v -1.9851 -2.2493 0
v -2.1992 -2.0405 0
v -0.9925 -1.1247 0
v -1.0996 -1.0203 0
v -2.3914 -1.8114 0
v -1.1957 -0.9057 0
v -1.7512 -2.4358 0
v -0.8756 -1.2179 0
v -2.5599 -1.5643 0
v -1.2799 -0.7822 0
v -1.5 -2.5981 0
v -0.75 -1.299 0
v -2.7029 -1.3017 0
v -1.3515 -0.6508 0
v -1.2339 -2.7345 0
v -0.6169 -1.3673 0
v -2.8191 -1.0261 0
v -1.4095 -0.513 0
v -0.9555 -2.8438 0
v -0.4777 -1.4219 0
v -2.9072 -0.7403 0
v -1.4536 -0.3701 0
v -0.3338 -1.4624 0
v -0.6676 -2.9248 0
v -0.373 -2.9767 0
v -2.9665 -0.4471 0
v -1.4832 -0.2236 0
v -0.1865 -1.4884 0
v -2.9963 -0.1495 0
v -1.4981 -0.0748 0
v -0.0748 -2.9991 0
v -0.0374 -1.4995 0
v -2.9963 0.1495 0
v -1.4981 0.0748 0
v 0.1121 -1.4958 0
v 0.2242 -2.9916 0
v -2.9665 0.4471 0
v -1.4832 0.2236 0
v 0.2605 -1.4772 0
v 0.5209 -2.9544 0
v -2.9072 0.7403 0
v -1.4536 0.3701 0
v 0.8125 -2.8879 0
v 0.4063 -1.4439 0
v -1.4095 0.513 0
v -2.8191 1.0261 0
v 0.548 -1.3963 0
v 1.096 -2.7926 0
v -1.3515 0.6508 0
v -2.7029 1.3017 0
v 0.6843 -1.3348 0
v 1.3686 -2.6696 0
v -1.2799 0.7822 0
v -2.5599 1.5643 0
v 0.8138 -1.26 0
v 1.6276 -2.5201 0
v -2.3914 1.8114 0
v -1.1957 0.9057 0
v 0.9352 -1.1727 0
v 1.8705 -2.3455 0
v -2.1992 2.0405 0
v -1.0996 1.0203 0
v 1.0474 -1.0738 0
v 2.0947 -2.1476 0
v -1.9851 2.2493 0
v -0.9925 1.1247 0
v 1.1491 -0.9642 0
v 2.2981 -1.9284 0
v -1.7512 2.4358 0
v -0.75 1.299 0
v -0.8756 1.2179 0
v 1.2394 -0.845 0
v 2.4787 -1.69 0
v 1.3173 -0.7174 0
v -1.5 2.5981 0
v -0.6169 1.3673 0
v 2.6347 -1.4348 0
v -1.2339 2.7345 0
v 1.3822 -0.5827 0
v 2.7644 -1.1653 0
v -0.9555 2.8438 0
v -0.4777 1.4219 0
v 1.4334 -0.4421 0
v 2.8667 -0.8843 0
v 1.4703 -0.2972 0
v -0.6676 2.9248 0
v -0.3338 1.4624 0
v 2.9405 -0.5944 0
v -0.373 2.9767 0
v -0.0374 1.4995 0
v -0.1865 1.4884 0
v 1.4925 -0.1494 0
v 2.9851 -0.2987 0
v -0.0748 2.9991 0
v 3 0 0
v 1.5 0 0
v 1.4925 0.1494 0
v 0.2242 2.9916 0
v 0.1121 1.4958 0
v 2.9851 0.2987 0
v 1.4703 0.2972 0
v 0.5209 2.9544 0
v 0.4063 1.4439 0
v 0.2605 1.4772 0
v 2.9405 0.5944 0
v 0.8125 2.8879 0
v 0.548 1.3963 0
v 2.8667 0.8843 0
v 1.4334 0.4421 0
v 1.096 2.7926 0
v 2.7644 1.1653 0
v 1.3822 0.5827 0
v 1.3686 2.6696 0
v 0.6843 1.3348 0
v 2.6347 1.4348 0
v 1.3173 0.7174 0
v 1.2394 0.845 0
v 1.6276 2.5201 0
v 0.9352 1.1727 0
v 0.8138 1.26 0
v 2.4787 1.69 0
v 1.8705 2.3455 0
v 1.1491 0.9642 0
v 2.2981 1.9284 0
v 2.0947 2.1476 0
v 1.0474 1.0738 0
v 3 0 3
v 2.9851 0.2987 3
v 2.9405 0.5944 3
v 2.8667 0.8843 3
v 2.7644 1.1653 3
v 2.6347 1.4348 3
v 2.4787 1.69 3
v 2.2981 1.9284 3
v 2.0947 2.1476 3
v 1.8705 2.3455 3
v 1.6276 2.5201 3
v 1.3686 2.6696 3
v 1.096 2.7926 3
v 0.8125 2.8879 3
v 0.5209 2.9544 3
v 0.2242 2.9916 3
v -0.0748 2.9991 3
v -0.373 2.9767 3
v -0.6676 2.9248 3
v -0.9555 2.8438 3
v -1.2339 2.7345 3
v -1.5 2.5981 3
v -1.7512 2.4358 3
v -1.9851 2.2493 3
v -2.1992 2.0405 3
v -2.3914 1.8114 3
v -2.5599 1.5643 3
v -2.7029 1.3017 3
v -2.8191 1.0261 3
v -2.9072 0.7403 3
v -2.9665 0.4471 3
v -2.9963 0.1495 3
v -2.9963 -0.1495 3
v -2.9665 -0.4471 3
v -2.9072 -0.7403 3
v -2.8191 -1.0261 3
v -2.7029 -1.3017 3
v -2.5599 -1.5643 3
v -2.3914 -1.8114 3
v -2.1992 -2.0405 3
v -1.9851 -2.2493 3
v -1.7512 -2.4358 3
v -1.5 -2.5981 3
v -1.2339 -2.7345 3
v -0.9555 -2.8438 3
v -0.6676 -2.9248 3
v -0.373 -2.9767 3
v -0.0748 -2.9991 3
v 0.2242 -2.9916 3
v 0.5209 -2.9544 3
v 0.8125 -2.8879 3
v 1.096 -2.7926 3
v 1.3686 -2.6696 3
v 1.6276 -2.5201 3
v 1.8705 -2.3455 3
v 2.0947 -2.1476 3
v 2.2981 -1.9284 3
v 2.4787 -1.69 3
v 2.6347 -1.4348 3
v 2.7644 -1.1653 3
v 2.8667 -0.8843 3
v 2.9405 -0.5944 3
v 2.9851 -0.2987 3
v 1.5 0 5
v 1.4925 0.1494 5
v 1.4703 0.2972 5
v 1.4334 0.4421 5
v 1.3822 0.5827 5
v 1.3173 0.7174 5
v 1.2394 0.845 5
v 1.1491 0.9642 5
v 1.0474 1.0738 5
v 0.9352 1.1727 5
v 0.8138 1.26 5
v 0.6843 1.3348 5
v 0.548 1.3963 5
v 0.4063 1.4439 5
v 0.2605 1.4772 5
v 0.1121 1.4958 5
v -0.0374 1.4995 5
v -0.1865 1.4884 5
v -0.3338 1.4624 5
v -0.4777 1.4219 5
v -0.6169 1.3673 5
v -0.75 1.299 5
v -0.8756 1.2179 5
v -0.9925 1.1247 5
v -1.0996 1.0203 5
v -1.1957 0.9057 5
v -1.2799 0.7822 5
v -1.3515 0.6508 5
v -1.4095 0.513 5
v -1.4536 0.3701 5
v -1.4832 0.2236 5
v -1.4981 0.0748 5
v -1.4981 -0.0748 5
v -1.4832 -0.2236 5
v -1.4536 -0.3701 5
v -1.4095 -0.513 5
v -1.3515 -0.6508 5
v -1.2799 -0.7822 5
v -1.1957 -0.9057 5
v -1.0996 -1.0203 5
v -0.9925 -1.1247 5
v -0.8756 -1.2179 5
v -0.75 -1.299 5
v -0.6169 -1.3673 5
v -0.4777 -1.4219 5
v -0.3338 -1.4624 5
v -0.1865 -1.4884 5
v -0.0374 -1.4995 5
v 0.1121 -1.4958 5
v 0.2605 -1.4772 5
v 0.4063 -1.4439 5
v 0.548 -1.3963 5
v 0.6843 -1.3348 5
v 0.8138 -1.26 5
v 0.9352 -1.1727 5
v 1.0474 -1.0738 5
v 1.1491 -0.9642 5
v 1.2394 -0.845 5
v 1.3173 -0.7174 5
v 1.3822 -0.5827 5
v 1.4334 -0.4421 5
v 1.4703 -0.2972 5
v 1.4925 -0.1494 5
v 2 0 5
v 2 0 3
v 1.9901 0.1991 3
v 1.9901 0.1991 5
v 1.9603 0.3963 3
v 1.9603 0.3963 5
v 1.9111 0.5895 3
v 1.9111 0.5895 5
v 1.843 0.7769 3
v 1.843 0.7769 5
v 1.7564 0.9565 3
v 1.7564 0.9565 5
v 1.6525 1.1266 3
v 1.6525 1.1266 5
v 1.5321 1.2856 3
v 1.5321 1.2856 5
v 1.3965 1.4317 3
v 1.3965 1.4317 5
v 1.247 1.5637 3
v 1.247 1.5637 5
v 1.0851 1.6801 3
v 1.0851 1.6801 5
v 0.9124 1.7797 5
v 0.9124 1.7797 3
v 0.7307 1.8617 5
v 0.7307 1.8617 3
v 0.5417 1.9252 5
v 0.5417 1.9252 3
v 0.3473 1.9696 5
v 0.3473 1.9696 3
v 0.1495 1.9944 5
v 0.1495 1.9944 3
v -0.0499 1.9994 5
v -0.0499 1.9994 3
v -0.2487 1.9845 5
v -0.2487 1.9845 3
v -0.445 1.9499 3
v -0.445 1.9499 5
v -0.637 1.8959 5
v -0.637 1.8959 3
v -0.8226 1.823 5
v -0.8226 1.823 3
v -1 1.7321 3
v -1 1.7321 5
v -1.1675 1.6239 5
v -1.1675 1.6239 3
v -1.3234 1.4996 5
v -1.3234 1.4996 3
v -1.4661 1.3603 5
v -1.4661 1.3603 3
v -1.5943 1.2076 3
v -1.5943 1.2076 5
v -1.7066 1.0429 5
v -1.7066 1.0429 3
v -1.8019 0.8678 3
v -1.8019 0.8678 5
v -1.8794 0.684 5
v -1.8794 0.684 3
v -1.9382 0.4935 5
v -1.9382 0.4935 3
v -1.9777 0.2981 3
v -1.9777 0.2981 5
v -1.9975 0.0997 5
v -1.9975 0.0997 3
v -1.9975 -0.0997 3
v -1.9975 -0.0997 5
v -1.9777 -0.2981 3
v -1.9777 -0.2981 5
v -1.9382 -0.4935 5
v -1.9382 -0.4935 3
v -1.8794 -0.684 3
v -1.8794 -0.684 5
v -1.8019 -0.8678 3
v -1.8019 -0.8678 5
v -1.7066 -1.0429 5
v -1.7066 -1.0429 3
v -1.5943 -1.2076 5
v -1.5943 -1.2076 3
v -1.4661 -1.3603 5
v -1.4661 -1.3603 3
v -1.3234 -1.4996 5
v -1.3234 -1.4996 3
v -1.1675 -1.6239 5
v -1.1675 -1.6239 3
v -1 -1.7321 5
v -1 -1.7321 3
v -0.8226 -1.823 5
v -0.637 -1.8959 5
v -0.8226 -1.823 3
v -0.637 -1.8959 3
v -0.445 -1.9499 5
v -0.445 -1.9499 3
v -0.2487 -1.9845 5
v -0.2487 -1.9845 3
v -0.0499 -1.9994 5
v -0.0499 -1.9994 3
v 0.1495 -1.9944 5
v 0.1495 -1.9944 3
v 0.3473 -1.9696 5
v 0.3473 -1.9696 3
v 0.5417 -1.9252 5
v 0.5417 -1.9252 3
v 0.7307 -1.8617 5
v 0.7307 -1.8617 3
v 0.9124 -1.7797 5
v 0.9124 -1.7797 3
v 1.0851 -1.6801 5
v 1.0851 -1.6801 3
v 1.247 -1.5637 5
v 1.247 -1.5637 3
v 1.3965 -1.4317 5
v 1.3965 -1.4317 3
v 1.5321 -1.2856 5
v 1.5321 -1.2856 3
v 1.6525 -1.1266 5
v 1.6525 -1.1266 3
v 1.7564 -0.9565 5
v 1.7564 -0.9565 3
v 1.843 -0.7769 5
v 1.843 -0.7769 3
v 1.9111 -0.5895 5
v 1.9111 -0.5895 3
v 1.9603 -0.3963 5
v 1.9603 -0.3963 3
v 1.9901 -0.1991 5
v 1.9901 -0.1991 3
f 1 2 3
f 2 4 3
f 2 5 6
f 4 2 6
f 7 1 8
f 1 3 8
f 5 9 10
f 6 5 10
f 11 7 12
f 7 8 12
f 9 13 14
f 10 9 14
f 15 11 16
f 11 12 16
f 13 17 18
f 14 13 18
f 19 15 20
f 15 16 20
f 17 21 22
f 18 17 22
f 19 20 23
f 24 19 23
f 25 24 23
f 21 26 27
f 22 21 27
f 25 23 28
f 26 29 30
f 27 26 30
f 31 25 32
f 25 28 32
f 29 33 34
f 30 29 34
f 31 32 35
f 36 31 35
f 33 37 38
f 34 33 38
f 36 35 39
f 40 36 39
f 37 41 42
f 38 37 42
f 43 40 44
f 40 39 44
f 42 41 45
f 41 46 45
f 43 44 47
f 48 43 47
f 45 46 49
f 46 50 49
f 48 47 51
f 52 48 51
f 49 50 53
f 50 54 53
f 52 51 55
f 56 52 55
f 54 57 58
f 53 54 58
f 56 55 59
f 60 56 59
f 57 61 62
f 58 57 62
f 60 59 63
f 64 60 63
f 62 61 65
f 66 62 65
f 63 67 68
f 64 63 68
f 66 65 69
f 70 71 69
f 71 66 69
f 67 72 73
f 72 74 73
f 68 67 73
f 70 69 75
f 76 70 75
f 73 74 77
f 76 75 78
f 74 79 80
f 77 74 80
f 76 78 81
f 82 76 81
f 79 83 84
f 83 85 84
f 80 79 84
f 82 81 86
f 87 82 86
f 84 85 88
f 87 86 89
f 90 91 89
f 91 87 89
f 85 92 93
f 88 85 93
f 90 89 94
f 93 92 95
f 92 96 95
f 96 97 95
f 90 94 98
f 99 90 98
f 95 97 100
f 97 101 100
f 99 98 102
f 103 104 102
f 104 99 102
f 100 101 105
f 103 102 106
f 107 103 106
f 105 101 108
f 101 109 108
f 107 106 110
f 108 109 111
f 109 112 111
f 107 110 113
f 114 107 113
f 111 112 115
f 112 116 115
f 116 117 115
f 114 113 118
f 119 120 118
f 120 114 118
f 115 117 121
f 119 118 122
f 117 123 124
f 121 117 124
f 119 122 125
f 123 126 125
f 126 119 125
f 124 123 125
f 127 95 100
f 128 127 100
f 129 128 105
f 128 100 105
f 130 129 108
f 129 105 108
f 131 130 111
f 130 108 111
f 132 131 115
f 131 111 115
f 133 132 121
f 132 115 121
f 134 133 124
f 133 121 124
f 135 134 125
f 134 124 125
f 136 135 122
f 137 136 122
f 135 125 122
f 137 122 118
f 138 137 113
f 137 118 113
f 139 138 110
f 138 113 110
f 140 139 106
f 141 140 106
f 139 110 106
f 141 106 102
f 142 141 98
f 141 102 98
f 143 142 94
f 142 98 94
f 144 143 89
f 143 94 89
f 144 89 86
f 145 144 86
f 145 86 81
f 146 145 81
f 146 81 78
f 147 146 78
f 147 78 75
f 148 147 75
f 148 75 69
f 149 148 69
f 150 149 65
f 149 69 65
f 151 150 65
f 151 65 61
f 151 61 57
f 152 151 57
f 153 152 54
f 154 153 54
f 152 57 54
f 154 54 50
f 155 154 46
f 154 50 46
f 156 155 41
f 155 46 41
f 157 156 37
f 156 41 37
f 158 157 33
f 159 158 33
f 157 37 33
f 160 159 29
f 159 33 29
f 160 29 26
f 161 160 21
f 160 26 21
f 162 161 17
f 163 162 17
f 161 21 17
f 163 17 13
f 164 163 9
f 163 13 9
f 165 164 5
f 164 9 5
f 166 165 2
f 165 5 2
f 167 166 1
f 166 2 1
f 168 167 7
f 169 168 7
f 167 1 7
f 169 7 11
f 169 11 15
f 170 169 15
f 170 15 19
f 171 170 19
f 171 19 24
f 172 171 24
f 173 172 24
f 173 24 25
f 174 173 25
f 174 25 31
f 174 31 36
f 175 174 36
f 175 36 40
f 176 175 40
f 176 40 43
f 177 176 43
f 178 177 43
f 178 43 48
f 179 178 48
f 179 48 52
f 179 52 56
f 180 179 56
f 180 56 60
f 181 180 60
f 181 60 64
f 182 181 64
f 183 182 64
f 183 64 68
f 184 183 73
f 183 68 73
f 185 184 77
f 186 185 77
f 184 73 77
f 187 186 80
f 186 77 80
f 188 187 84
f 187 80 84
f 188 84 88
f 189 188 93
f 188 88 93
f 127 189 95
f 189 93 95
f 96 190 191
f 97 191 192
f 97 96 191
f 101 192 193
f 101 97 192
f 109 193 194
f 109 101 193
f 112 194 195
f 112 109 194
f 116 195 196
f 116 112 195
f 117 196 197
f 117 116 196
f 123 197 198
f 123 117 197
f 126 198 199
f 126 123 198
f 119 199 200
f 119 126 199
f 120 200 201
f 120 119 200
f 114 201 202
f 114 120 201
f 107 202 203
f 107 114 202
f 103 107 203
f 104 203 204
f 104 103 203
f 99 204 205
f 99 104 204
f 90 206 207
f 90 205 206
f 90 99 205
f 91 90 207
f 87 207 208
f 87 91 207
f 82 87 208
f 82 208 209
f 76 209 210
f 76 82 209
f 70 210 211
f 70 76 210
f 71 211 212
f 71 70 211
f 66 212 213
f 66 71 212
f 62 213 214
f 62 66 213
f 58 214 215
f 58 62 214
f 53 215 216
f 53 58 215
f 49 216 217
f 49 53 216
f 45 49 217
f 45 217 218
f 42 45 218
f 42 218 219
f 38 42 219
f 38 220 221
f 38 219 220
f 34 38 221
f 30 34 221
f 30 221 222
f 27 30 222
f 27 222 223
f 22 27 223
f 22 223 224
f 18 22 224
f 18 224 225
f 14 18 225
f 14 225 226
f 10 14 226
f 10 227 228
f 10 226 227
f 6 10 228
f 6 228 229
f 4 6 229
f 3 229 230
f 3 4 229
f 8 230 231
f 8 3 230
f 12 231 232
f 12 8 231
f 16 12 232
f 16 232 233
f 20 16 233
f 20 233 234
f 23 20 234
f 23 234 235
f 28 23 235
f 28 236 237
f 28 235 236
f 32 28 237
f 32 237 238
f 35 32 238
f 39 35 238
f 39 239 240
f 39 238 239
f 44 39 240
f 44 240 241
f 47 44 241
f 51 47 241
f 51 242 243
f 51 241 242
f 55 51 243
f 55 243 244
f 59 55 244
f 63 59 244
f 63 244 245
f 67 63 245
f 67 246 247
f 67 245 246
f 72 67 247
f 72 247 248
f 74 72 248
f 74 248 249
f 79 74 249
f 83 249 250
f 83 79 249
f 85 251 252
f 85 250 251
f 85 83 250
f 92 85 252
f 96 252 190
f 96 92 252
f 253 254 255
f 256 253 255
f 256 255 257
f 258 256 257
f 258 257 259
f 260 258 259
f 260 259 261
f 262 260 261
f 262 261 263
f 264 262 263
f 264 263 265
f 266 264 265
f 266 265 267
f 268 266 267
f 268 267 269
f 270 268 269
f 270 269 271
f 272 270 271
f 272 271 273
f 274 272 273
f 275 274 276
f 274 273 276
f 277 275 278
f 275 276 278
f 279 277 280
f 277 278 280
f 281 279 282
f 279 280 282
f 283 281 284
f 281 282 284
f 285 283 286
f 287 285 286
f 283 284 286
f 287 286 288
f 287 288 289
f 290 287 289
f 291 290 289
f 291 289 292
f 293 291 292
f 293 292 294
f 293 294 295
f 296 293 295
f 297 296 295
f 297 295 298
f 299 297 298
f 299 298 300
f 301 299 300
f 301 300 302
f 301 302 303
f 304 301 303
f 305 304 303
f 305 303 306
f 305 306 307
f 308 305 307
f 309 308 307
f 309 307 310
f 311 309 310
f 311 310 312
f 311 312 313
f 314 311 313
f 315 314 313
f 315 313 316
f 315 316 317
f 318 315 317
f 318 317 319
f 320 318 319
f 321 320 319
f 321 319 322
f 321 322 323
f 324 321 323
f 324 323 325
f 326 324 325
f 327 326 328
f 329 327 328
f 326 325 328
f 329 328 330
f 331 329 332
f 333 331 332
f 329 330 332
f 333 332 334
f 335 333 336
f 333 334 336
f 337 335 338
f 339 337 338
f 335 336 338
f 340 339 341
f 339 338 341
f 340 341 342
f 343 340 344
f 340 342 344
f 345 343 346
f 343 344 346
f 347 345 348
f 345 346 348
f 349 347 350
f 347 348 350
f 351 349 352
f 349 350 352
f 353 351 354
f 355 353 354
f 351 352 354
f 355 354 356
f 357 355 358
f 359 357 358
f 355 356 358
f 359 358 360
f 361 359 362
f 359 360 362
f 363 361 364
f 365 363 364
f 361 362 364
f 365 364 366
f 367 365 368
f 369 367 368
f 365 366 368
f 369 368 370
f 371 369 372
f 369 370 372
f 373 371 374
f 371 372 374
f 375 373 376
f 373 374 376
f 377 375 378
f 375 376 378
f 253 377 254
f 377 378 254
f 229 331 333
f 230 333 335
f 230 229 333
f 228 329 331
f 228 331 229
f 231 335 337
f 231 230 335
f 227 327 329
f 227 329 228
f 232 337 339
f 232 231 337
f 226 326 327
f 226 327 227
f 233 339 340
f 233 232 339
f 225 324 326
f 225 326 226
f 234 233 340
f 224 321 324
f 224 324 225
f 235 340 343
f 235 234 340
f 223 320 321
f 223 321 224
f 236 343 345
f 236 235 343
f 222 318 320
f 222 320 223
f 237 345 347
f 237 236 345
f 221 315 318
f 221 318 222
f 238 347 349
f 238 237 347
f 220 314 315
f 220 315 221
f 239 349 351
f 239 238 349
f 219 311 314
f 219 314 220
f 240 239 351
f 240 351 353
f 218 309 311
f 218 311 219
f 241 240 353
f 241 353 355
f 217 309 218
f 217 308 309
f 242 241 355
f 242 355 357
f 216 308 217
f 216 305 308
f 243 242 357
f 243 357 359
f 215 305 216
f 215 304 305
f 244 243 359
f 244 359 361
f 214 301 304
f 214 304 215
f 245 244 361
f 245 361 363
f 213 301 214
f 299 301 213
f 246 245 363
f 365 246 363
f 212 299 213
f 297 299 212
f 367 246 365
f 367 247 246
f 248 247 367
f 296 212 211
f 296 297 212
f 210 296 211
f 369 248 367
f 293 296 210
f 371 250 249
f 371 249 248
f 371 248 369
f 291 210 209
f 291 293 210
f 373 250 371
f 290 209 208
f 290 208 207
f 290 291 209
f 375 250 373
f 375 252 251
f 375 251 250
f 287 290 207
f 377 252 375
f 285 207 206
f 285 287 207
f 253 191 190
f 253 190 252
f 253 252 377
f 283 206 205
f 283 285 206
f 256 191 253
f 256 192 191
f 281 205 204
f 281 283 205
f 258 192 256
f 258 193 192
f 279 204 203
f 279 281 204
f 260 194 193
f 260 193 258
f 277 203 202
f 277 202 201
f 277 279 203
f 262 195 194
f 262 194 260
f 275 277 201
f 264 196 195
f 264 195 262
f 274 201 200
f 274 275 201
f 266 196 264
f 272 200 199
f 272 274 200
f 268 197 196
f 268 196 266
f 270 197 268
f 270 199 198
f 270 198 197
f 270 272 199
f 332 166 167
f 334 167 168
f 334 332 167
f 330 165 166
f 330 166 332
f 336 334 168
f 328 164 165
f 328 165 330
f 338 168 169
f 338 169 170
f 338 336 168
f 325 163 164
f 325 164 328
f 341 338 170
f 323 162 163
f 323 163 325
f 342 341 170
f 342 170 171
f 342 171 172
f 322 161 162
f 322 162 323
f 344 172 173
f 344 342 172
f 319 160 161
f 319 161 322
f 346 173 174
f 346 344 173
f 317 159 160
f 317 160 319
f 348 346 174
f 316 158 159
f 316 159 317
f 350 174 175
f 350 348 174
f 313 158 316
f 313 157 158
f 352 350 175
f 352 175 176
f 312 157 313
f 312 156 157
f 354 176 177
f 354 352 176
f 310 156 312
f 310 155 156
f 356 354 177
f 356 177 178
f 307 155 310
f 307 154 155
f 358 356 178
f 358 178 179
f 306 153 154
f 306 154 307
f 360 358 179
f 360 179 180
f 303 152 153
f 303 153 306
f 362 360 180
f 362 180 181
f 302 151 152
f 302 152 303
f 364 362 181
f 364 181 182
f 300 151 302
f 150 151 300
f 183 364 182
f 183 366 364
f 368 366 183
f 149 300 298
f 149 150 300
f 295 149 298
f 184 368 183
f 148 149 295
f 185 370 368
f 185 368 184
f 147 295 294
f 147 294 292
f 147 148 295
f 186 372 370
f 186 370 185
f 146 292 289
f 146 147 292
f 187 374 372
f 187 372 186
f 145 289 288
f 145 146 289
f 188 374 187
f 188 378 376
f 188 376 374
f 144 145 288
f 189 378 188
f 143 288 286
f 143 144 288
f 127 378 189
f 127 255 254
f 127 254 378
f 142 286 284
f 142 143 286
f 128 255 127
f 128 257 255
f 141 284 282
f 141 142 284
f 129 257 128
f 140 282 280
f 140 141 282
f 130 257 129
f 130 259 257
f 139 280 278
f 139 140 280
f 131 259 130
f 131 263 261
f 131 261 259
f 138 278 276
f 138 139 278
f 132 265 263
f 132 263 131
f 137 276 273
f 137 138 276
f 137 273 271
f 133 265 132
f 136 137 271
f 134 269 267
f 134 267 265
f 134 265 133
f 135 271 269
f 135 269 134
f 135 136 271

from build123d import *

# Parameters (mm, degrees)
SKETCH_1_R          = 3
EXTRUDE_1_DEPTH     = 3
SKETCH_1_3_R        = 2
EXTRUDE_2_DEPTH     = 5
SKETCH_1_4_R        = 1.5
CUT_EXTRUDE_1_DEPTH = 6


with BuildPart() as part:
    # Sketch 1 → Extrude 1 (new body)
    with BuildSketch(Plane.XY):
        Circle(SKETCH_1_R)
    extrude(amount=EXTRUDE_1_DEPTH)

    # Sketch 1_3 → Extrude 2 (add)
    with BuildSketch(Plane.XY):
        Circle(SKETCH_1_3_R)
    extrude(amount=EXTRUDE_2_DEPTH)

    # Sketch 1_4 → Cut-Extrude 1 (cut, through all)
    with BuildSketch(Plane.XY):
        Circle(SKETCH_1_4_R)
    extrude(amount=CUT_EXTRUDE_1_DEPTH, mode=Mode.SUBTRACT)


solid = part.part
